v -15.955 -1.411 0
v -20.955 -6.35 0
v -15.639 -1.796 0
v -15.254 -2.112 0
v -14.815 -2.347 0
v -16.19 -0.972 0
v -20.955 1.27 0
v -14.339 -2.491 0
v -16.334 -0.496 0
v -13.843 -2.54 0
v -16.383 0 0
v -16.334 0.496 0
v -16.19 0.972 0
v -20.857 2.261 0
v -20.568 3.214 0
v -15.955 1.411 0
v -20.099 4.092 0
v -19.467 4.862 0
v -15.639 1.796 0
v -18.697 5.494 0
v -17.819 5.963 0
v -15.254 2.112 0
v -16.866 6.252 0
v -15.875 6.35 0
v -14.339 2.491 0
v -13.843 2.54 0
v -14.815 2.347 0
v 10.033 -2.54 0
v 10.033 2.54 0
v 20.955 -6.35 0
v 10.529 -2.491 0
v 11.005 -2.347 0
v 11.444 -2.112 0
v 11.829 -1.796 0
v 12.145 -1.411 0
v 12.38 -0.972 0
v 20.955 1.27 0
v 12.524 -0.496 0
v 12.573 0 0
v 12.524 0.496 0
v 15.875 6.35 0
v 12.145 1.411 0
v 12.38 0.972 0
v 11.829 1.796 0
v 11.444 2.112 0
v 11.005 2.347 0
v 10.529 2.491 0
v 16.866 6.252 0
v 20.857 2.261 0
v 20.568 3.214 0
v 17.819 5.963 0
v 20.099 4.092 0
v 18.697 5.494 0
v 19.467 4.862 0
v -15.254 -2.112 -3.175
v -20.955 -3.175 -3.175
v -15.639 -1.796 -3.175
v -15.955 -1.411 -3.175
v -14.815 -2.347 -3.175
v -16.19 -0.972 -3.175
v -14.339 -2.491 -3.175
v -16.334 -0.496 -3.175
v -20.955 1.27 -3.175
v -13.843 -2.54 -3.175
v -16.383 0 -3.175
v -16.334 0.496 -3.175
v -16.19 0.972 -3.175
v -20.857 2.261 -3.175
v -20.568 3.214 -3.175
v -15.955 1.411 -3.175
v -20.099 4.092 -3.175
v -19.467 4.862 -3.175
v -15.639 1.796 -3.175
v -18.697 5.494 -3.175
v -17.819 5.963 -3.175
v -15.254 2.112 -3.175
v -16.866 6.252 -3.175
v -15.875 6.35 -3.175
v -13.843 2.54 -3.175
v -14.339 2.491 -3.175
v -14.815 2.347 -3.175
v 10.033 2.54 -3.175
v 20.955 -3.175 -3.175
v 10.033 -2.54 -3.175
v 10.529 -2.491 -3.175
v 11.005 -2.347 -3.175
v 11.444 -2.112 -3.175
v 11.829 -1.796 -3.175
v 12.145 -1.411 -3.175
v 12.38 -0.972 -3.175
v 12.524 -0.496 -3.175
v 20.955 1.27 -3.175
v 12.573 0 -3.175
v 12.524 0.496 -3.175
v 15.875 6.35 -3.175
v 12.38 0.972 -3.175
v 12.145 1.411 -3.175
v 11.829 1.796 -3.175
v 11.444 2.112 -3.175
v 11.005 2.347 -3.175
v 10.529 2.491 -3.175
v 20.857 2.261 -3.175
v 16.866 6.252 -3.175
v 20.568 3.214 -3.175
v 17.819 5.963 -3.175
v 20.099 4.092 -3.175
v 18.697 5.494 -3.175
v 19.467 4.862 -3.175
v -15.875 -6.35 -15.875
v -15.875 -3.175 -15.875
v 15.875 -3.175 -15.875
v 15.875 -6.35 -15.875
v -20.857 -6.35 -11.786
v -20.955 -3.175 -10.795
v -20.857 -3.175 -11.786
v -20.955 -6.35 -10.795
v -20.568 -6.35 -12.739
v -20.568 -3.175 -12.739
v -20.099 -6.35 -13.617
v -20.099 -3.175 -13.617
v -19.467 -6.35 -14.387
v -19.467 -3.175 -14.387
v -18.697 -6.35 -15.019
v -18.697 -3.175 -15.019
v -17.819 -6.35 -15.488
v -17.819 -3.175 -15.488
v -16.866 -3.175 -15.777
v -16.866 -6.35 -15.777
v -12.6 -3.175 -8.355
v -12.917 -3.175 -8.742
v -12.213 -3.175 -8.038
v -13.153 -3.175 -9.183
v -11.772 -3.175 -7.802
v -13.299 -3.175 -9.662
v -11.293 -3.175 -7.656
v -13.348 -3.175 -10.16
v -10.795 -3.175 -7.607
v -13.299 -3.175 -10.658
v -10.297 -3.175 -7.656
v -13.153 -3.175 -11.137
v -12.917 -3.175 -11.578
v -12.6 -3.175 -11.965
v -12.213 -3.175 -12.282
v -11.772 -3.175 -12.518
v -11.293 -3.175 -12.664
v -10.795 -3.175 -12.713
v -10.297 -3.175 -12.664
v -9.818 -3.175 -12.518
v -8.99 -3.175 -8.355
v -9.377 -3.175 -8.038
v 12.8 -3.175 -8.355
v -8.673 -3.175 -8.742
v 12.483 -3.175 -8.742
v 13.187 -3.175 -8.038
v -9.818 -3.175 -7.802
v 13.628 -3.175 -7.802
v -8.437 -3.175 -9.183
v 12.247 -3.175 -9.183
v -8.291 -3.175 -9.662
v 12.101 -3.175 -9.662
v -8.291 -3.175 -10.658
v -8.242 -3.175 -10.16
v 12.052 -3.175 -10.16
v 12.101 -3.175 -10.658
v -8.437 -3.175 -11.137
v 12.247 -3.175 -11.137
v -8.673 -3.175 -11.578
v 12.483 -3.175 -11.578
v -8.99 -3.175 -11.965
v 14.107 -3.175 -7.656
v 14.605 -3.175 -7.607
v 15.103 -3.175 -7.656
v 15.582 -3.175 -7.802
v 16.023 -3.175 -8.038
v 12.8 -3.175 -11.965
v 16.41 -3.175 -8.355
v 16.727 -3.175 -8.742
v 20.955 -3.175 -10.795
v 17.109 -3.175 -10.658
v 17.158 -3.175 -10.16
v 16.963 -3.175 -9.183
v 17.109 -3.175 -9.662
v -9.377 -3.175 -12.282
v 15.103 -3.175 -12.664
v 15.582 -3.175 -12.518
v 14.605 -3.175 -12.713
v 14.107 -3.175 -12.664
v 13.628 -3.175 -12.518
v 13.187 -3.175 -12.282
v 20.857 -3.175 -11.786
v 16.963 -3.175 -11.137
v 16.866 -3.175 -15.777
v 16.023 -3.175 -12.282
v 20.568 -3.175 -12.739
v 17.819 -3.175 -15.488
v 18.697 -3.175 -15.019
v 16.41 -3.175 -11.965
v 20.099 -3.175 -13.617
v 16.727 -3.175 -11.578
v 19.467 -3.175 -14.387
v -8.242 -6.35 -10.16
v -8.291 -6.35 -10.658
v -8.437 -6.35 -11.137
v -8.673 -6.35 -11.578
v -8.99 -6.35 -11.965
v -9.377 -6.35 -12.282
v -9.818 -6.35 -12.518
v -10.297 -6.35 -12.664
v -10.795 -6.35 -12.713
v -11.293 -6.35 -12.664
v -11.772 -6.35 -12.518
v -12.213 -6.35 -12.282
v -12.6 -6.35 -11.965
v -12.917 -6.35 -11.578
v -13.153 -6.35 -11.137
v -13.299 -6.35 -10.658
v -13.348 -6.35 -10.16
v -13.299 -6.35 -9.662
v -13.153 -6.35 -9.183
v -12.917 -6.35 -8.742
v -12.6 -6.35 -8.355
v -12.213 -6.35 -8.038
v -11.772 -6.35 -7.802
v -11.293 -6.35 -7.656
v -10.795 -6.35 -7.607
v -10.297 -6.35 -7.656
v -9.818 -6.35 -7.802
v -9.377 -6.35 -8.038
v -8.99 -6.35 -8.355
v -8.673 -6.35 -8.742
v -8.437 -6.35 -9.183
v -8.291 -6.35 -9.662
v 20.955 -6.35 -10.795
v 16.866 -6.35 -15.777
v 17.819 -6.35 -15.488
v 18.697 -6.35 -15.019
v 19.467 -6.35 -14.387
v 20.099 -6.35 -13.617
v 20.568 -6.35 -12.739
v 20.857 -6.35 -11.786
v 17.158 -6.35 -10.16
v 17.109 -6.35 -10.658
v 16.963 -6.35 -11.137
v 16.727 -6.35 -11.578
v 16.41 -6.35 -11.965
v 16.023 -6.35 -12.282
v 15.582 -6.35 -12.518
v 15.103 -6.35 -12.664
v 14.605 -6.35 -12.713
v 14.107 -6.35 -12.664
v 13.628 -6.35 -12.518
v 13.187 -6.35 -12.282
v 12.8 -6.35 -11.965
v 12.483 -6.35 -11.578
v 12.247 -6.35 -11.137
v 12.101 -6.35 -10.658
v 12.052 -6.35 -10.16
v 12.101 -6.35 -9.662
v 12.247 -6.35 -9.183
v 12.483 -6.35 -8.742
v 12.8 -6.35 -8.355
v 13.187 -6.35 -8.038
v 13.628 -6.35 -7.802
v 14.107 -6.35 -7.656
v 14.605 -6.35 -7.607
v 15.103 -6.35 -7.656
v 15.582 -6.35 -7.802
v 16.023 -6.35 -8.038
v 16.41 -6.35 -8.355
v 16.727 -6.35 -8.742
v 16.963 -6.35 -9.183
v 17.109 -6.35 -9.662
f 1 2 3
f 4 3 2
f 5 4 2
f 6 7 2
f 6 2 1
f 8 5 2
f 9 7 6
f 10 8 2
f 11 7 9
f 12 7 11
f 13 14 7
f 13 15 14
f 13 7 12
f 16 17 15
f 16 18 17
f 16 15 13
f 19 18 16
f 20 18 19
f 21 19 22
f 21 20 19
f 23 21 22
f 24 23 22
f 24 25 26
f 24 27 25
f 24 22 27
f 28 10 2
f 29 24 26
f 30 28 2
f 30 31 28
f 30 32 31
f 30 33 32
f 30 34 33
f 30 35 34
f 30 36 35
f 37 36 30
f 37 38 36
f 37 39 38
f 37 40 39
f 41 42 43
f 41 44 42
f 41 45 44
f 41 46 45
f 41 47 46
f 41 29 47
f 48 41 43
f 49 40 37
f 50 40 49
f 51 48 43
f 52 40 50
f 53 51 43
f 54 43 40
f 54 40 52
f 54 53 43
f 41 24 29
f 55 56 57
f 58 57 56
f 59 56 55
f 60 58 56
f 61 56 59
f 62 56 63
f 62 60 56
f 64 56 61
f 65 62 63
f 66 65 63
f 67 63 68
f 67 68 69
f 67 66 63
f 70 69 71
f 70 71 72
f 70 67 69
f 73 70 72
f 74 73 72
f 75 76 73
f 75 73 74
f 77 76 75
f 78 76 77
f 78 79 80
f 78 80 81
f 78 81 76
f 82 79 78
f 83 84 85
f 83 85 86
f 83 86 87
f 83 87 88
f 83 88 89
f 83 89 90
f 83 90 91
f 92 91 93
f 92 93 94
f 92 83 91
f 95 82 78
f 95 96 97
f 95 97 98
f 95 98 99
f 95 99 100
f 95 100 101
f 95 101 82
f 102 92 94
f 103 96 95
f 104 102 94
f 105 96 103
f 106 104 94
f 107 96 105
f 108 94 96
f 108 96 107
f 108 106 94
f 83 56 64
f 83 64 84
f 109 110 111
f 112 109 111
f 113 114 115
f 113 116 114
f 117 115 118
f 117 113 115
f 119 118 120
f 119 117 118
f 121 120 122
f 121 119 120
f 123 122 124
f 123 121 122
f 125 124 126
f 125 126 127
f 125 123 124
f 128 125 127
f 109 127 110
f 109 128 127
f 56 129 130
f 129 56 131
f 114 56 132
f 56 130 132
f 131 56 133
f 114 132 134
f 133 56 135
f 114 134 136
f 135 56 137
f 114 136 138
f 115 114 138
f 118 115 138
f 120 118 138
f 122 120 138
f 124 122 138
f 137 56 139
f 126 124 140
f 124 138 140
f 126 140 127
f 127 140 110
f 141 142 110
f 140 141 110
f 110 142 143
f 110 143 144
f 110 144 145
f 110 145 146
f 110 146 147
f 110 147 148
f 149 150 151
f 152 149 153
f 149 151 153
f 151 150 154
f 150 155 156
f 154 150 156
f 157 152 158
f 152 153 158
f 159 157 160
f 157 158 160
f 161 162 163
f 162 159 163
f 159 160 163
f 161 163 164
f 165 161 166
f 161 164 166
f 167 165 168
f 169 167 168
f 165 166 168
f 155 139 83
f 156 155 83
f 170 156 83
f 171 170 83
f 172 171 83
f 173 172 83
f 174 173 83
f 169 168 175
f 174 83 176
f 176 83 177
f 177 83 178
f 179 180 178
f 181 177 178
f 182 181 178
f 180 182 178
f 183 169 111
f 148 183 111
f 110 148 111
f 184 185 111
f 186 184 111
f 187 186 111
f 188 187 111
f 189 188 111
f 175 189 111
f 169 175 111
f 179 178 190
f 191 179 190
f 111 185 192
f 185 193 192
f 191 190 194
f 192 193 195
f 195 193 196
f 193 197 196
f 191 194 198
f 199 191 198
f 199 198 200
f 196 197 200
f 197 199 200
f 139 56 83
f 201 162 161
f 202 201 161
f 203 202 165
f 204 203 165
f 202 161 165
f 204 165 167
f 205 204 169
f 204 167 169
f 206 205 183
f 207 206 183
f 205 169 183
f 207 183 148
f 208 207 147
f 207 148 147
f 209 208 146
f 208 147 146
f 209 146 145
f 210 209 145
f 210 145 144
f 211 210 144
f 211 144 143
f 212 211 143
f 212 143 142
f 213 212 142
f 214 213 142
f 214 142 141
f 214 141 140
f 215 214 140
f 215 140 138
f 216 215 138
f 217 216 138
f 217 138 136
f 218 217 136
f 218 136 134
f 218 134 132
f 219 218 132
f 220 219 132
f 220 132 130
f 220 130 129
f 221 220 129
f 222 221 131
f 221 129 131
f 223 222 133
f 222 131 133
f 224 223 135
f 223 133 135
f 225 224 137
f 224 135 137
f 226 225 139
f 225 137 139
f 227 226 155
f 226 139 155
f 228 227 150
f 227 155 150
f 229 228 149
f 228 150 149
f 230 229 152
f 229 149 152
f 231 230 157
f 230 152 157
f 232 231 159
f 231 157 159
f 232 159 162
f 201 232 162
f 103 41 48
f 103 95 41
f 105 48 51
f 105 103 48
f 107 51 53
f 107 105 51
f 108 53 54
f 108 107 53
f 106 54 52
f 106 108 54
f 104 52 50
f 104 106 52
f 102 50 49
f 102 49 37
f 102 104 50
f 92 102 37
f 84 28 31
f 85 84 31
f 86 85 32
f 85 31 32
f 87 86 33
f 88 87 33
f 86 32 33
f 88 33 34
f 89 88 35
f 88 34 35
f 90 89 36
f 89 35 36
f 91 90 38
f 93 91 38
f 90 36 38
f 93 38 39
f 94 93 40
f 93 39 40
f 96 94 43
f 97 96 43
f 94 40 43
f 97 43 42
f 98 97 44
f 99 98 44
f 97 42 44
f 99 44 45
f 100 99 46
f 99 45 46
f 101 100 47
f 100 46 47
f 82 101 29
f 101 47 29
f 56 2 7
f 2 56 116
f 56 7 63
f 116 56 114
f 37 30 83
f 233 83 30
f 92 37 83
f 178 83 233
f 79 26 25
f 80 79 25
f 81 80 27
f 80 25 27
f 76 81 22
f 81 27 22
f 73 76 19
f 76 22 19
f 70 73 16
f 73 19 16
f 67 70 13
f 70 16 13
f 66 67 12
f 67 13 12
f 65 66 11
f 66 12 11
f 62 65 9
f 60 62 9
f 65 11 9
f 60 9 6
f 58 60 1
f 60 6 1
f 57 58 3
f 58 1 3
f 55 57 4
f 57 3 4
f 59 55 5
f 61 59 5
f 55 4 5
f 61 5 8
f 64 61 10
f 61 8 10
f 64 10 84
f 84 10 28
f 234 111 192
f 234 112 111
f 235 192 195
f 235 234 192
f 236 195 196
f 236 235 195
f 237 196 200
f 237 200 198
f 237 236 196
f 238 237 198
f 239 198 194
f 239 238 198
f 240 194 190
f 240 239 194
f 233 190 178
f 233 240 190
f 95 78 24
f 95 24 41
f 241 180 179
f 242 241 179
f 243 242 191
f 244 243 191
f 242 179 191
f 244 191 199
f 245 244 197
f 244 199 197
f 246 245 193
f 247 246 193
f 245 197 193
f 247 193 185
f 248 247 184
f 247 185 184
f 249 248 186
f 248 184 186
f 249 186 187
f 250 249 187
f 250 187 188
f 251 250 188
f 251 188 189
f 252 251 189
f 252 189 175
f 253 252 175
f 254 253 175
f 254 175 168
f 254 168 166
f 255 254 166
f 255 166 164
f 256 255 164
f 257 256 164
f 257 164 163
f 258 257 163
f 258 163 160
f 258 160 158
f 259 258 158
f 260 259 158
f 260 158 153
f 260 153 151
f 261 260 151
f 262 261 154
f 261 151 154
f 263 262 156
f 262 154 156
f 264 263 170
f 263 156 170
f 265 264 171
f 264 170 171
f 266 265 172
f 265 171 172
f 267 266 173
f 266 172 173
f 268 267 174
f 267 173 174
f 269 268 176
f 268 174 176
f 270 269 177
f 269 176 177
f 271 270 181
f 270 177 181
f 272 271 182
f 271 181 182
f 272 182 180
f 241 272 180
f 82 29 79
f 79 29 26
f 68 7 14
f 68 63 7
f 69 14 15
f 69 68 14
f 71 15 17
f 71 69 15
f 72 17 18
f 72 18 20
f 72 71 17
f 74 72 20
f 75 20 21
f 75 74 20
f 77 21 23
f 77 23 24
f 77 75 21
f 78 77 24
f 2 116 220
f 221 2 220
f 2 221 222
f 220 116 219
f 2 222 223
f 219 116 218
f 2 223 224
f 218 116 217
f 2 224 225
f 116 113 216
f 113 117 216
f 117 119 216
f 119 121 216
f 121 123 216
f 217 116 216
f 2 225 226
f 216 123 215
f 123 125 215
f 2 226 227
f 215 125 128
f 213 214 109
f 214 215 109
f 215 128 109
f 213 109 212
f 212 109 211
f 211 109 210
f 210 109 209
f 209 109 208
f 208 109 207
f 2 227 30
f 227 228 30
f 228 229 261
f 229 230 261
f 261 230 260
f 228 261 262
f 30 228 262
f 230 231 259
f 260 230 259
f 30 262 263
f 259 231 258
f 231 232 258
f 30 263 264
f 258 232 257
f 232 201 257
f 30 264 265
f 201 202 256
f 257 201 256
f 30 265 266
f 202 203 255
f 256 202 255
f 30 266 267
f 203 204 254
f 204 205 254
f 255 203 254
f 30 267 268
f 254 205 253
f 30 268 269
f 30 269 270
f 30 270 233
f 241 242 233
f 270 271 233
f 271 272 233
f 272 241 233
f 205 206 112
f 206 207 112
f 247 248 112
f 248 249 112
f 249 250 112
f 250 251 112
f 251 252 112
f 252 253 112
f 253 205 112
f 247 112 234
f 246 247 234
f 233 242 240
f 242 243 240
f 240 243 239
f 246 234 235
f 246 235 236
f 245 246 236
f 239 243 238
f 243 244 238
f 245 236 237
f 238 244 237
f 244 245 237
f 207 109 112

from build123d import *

# Parameters (mm, degrees)
SKETCH1_W           = 41.91
SKETCH1_H           = 15.875
BOSS_EXTRUDE1_DEPTH = 12.7
SKETCH2_W           = 12.7
SKETCH2_H           = 9.525
CUT_EXTRUDE1_DEPTH  = 46.263519803
CUT_EXTRUDE2_DEPTH  = 28.045335088
HOLE1_D             = 5.1054
HOLE1_DEPTH         = 12.7
FILLET1_R           = 5.08


with BuildPart() as part:
    # Sketch1 → Boss-Extrude1 (new body)
    with BuildSketch(Plane(origin=(0, 6.35, 0), x_dir=(1, 0, 0), z_dir=(0, 1, 0))):
        with Locations((0, 7.9375)):
            Rectangle(SKETCH1_W, SKETCH1_H)
    extrude(amount=-BOSS_EXTRUDE1_DEPTH)

    # Sketch2 → Cut-Extrude1 (cut, through all)
    with BuildSketch(Plane(origin=(20.955, 0, 0), x_dir=(0, 0, -1), z_dir=(1, 0, 0))):
        with Locations((9.525, 1.5875)):
            Rectangle(SKETCH2_W, SKETCH2_H)
    extrude(amount=-CUT_EXTRUDE1_DEPTH, mode=Mode.SUBTRACT)

    # Sketch3 → Cut-Extrude2 (cut, through all)
    with BuildSketch(Plane.XY):
        with BuildLine():
            Line((-13.843, -2.54), (10.033, -2.54))
            ThreePointArc((10.033, -2.54), (12.573, 0), (10.033, 2.54))
            Line((10.033, 2.54), (-13.843, 2.54))
            ThreePointArc((-13.843, 2.54), (-16.383, 0), (-13.843, -2.54))
        make_face()
    extrude(amount=-CUT_EXTRUDE2_DEPTH, mode=Mode.SUBTRACT)

    # Hole1
    with Locations(Plane(origin=(0, -6.35, 0), x_dir=(-1, 0, 0), z_dir=(0, -1, 0))):
        with Locations((10.795, 10.16), (-14.605, 10.16)):
            Hole(HOLE1_D / 2, depth=HOLE1_DEPTH)

    # Fillet1
    fillet1_edges = [part.edges().sort_by_distance(p)[0] for p in [
        (-20.955, 6.35, -1.5875),
        (20.955, 6.35, -1.5875),
        (-20.955, -4.7625, -15.875),
        (20.955, -4.7625, -15.875),
    ]]
    fillet(fillet1_edges, radius=FILLET1_R)


solid = part.part
